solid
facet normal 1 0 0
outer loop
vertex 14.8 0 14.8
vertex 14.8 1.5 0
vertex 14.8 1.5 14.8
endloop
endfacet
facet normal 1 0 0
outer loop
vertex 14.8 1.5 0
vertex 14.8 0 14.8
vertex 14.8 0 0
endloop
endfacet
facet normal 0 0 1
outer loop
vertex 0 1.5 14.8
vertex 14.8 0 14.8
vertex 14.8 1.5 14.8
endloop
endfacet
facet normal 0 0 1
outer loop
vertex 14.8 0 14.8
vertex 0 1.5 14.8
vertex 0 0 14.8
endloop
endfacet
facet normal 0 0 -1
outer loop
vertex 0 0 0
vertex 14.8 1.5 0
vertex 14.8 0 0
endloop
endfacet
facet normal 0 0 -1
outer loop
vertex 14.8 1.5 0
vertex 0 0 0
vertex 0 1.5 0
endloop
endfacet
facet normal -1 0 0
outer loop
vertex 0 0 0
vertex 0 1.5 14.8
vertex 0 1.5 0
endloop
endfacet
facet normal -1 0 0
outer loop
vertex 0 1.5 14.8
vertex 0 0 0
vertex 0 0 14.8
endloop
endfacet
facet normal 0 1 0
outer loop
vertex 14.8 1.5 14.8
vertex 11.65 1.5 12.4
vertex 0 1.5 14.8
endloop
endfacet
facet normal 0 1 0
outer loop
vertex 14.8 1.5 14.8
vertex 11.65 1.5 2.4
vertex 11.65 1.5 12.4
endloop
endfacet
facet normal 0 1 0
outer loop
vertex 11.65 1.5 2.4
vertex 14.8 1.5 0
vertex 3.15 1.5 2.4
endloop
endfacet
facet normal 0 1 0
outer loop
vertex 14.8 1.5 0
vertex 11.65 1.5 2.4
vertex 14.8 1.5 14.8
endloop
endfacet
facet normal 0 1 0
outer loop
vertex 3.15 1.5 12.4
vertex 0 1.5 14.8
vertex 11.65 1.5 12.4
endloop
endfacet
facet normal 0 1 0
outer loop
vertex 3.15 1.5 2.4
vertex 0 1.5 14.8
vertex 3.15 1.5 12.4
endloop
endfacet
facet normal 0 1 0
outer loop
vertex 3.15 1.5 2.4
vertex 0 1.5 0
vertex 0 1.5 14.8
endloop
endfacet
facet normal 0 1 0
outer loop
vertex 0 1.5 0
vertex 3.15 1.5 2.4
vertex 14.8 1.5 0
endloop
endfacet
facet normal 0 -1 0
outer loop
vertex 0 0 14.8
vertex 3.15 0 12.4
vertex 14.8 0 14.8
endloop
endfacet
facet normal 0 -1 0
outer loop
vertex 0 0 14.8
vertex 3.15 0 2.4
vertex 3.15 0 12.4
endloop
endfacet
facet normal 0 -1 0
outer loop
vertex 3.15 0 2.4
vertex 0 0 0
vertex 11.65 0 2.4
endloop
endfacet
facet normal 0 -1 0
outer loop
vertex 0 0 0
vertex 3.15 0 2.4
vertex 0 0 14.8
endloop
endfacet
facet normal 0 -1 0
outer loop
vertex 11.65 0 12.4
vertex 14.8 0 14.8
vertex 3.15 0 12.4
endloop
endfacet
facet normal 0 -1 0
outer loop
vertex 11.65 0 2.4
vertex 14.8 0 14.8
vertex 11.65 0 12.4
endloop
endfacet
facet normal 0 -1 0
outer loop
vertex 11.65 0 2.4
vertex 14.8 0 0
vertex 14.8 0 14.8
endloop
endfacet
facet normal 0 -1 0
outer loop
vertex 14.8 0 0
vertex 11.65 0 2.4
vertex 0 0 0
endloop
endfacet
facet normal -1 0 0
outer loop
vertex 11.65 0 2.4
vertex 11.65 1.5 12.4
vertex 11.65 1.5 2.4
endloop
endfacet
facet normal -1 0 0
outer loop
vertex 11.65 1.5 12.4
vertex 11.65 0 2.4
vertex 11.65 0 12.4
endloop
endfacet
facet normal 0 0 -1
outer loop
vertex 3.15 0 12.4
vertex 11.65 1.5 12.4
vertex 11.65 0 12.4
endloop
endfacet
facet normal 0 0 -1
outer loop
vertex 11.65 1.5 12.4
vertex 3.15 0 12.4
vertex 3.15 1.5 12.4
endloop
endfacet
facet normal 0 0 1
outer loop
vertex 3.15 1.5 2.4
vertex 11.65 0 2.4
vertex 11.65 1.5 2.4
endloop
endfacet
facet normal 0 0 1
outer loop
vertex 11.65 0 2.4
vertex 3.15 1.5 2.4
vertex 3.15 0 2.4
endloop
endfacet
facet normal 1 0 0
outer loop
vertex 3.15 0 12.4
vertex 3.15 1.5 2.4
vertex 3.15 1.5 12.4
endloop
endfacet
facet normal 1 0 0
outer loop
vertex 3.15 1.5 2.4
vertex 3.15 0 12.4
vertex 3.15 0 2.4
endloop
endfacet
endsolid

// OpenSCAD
h=14.8;
w=h;
t=1.5;

bs=8.5;
hs=10;

difference()
{
cube([w,t,h]);

translate([(w-bs)/2,0,(h-hs)/2])
color("blue")
cube([bs,t,hs]);
}
